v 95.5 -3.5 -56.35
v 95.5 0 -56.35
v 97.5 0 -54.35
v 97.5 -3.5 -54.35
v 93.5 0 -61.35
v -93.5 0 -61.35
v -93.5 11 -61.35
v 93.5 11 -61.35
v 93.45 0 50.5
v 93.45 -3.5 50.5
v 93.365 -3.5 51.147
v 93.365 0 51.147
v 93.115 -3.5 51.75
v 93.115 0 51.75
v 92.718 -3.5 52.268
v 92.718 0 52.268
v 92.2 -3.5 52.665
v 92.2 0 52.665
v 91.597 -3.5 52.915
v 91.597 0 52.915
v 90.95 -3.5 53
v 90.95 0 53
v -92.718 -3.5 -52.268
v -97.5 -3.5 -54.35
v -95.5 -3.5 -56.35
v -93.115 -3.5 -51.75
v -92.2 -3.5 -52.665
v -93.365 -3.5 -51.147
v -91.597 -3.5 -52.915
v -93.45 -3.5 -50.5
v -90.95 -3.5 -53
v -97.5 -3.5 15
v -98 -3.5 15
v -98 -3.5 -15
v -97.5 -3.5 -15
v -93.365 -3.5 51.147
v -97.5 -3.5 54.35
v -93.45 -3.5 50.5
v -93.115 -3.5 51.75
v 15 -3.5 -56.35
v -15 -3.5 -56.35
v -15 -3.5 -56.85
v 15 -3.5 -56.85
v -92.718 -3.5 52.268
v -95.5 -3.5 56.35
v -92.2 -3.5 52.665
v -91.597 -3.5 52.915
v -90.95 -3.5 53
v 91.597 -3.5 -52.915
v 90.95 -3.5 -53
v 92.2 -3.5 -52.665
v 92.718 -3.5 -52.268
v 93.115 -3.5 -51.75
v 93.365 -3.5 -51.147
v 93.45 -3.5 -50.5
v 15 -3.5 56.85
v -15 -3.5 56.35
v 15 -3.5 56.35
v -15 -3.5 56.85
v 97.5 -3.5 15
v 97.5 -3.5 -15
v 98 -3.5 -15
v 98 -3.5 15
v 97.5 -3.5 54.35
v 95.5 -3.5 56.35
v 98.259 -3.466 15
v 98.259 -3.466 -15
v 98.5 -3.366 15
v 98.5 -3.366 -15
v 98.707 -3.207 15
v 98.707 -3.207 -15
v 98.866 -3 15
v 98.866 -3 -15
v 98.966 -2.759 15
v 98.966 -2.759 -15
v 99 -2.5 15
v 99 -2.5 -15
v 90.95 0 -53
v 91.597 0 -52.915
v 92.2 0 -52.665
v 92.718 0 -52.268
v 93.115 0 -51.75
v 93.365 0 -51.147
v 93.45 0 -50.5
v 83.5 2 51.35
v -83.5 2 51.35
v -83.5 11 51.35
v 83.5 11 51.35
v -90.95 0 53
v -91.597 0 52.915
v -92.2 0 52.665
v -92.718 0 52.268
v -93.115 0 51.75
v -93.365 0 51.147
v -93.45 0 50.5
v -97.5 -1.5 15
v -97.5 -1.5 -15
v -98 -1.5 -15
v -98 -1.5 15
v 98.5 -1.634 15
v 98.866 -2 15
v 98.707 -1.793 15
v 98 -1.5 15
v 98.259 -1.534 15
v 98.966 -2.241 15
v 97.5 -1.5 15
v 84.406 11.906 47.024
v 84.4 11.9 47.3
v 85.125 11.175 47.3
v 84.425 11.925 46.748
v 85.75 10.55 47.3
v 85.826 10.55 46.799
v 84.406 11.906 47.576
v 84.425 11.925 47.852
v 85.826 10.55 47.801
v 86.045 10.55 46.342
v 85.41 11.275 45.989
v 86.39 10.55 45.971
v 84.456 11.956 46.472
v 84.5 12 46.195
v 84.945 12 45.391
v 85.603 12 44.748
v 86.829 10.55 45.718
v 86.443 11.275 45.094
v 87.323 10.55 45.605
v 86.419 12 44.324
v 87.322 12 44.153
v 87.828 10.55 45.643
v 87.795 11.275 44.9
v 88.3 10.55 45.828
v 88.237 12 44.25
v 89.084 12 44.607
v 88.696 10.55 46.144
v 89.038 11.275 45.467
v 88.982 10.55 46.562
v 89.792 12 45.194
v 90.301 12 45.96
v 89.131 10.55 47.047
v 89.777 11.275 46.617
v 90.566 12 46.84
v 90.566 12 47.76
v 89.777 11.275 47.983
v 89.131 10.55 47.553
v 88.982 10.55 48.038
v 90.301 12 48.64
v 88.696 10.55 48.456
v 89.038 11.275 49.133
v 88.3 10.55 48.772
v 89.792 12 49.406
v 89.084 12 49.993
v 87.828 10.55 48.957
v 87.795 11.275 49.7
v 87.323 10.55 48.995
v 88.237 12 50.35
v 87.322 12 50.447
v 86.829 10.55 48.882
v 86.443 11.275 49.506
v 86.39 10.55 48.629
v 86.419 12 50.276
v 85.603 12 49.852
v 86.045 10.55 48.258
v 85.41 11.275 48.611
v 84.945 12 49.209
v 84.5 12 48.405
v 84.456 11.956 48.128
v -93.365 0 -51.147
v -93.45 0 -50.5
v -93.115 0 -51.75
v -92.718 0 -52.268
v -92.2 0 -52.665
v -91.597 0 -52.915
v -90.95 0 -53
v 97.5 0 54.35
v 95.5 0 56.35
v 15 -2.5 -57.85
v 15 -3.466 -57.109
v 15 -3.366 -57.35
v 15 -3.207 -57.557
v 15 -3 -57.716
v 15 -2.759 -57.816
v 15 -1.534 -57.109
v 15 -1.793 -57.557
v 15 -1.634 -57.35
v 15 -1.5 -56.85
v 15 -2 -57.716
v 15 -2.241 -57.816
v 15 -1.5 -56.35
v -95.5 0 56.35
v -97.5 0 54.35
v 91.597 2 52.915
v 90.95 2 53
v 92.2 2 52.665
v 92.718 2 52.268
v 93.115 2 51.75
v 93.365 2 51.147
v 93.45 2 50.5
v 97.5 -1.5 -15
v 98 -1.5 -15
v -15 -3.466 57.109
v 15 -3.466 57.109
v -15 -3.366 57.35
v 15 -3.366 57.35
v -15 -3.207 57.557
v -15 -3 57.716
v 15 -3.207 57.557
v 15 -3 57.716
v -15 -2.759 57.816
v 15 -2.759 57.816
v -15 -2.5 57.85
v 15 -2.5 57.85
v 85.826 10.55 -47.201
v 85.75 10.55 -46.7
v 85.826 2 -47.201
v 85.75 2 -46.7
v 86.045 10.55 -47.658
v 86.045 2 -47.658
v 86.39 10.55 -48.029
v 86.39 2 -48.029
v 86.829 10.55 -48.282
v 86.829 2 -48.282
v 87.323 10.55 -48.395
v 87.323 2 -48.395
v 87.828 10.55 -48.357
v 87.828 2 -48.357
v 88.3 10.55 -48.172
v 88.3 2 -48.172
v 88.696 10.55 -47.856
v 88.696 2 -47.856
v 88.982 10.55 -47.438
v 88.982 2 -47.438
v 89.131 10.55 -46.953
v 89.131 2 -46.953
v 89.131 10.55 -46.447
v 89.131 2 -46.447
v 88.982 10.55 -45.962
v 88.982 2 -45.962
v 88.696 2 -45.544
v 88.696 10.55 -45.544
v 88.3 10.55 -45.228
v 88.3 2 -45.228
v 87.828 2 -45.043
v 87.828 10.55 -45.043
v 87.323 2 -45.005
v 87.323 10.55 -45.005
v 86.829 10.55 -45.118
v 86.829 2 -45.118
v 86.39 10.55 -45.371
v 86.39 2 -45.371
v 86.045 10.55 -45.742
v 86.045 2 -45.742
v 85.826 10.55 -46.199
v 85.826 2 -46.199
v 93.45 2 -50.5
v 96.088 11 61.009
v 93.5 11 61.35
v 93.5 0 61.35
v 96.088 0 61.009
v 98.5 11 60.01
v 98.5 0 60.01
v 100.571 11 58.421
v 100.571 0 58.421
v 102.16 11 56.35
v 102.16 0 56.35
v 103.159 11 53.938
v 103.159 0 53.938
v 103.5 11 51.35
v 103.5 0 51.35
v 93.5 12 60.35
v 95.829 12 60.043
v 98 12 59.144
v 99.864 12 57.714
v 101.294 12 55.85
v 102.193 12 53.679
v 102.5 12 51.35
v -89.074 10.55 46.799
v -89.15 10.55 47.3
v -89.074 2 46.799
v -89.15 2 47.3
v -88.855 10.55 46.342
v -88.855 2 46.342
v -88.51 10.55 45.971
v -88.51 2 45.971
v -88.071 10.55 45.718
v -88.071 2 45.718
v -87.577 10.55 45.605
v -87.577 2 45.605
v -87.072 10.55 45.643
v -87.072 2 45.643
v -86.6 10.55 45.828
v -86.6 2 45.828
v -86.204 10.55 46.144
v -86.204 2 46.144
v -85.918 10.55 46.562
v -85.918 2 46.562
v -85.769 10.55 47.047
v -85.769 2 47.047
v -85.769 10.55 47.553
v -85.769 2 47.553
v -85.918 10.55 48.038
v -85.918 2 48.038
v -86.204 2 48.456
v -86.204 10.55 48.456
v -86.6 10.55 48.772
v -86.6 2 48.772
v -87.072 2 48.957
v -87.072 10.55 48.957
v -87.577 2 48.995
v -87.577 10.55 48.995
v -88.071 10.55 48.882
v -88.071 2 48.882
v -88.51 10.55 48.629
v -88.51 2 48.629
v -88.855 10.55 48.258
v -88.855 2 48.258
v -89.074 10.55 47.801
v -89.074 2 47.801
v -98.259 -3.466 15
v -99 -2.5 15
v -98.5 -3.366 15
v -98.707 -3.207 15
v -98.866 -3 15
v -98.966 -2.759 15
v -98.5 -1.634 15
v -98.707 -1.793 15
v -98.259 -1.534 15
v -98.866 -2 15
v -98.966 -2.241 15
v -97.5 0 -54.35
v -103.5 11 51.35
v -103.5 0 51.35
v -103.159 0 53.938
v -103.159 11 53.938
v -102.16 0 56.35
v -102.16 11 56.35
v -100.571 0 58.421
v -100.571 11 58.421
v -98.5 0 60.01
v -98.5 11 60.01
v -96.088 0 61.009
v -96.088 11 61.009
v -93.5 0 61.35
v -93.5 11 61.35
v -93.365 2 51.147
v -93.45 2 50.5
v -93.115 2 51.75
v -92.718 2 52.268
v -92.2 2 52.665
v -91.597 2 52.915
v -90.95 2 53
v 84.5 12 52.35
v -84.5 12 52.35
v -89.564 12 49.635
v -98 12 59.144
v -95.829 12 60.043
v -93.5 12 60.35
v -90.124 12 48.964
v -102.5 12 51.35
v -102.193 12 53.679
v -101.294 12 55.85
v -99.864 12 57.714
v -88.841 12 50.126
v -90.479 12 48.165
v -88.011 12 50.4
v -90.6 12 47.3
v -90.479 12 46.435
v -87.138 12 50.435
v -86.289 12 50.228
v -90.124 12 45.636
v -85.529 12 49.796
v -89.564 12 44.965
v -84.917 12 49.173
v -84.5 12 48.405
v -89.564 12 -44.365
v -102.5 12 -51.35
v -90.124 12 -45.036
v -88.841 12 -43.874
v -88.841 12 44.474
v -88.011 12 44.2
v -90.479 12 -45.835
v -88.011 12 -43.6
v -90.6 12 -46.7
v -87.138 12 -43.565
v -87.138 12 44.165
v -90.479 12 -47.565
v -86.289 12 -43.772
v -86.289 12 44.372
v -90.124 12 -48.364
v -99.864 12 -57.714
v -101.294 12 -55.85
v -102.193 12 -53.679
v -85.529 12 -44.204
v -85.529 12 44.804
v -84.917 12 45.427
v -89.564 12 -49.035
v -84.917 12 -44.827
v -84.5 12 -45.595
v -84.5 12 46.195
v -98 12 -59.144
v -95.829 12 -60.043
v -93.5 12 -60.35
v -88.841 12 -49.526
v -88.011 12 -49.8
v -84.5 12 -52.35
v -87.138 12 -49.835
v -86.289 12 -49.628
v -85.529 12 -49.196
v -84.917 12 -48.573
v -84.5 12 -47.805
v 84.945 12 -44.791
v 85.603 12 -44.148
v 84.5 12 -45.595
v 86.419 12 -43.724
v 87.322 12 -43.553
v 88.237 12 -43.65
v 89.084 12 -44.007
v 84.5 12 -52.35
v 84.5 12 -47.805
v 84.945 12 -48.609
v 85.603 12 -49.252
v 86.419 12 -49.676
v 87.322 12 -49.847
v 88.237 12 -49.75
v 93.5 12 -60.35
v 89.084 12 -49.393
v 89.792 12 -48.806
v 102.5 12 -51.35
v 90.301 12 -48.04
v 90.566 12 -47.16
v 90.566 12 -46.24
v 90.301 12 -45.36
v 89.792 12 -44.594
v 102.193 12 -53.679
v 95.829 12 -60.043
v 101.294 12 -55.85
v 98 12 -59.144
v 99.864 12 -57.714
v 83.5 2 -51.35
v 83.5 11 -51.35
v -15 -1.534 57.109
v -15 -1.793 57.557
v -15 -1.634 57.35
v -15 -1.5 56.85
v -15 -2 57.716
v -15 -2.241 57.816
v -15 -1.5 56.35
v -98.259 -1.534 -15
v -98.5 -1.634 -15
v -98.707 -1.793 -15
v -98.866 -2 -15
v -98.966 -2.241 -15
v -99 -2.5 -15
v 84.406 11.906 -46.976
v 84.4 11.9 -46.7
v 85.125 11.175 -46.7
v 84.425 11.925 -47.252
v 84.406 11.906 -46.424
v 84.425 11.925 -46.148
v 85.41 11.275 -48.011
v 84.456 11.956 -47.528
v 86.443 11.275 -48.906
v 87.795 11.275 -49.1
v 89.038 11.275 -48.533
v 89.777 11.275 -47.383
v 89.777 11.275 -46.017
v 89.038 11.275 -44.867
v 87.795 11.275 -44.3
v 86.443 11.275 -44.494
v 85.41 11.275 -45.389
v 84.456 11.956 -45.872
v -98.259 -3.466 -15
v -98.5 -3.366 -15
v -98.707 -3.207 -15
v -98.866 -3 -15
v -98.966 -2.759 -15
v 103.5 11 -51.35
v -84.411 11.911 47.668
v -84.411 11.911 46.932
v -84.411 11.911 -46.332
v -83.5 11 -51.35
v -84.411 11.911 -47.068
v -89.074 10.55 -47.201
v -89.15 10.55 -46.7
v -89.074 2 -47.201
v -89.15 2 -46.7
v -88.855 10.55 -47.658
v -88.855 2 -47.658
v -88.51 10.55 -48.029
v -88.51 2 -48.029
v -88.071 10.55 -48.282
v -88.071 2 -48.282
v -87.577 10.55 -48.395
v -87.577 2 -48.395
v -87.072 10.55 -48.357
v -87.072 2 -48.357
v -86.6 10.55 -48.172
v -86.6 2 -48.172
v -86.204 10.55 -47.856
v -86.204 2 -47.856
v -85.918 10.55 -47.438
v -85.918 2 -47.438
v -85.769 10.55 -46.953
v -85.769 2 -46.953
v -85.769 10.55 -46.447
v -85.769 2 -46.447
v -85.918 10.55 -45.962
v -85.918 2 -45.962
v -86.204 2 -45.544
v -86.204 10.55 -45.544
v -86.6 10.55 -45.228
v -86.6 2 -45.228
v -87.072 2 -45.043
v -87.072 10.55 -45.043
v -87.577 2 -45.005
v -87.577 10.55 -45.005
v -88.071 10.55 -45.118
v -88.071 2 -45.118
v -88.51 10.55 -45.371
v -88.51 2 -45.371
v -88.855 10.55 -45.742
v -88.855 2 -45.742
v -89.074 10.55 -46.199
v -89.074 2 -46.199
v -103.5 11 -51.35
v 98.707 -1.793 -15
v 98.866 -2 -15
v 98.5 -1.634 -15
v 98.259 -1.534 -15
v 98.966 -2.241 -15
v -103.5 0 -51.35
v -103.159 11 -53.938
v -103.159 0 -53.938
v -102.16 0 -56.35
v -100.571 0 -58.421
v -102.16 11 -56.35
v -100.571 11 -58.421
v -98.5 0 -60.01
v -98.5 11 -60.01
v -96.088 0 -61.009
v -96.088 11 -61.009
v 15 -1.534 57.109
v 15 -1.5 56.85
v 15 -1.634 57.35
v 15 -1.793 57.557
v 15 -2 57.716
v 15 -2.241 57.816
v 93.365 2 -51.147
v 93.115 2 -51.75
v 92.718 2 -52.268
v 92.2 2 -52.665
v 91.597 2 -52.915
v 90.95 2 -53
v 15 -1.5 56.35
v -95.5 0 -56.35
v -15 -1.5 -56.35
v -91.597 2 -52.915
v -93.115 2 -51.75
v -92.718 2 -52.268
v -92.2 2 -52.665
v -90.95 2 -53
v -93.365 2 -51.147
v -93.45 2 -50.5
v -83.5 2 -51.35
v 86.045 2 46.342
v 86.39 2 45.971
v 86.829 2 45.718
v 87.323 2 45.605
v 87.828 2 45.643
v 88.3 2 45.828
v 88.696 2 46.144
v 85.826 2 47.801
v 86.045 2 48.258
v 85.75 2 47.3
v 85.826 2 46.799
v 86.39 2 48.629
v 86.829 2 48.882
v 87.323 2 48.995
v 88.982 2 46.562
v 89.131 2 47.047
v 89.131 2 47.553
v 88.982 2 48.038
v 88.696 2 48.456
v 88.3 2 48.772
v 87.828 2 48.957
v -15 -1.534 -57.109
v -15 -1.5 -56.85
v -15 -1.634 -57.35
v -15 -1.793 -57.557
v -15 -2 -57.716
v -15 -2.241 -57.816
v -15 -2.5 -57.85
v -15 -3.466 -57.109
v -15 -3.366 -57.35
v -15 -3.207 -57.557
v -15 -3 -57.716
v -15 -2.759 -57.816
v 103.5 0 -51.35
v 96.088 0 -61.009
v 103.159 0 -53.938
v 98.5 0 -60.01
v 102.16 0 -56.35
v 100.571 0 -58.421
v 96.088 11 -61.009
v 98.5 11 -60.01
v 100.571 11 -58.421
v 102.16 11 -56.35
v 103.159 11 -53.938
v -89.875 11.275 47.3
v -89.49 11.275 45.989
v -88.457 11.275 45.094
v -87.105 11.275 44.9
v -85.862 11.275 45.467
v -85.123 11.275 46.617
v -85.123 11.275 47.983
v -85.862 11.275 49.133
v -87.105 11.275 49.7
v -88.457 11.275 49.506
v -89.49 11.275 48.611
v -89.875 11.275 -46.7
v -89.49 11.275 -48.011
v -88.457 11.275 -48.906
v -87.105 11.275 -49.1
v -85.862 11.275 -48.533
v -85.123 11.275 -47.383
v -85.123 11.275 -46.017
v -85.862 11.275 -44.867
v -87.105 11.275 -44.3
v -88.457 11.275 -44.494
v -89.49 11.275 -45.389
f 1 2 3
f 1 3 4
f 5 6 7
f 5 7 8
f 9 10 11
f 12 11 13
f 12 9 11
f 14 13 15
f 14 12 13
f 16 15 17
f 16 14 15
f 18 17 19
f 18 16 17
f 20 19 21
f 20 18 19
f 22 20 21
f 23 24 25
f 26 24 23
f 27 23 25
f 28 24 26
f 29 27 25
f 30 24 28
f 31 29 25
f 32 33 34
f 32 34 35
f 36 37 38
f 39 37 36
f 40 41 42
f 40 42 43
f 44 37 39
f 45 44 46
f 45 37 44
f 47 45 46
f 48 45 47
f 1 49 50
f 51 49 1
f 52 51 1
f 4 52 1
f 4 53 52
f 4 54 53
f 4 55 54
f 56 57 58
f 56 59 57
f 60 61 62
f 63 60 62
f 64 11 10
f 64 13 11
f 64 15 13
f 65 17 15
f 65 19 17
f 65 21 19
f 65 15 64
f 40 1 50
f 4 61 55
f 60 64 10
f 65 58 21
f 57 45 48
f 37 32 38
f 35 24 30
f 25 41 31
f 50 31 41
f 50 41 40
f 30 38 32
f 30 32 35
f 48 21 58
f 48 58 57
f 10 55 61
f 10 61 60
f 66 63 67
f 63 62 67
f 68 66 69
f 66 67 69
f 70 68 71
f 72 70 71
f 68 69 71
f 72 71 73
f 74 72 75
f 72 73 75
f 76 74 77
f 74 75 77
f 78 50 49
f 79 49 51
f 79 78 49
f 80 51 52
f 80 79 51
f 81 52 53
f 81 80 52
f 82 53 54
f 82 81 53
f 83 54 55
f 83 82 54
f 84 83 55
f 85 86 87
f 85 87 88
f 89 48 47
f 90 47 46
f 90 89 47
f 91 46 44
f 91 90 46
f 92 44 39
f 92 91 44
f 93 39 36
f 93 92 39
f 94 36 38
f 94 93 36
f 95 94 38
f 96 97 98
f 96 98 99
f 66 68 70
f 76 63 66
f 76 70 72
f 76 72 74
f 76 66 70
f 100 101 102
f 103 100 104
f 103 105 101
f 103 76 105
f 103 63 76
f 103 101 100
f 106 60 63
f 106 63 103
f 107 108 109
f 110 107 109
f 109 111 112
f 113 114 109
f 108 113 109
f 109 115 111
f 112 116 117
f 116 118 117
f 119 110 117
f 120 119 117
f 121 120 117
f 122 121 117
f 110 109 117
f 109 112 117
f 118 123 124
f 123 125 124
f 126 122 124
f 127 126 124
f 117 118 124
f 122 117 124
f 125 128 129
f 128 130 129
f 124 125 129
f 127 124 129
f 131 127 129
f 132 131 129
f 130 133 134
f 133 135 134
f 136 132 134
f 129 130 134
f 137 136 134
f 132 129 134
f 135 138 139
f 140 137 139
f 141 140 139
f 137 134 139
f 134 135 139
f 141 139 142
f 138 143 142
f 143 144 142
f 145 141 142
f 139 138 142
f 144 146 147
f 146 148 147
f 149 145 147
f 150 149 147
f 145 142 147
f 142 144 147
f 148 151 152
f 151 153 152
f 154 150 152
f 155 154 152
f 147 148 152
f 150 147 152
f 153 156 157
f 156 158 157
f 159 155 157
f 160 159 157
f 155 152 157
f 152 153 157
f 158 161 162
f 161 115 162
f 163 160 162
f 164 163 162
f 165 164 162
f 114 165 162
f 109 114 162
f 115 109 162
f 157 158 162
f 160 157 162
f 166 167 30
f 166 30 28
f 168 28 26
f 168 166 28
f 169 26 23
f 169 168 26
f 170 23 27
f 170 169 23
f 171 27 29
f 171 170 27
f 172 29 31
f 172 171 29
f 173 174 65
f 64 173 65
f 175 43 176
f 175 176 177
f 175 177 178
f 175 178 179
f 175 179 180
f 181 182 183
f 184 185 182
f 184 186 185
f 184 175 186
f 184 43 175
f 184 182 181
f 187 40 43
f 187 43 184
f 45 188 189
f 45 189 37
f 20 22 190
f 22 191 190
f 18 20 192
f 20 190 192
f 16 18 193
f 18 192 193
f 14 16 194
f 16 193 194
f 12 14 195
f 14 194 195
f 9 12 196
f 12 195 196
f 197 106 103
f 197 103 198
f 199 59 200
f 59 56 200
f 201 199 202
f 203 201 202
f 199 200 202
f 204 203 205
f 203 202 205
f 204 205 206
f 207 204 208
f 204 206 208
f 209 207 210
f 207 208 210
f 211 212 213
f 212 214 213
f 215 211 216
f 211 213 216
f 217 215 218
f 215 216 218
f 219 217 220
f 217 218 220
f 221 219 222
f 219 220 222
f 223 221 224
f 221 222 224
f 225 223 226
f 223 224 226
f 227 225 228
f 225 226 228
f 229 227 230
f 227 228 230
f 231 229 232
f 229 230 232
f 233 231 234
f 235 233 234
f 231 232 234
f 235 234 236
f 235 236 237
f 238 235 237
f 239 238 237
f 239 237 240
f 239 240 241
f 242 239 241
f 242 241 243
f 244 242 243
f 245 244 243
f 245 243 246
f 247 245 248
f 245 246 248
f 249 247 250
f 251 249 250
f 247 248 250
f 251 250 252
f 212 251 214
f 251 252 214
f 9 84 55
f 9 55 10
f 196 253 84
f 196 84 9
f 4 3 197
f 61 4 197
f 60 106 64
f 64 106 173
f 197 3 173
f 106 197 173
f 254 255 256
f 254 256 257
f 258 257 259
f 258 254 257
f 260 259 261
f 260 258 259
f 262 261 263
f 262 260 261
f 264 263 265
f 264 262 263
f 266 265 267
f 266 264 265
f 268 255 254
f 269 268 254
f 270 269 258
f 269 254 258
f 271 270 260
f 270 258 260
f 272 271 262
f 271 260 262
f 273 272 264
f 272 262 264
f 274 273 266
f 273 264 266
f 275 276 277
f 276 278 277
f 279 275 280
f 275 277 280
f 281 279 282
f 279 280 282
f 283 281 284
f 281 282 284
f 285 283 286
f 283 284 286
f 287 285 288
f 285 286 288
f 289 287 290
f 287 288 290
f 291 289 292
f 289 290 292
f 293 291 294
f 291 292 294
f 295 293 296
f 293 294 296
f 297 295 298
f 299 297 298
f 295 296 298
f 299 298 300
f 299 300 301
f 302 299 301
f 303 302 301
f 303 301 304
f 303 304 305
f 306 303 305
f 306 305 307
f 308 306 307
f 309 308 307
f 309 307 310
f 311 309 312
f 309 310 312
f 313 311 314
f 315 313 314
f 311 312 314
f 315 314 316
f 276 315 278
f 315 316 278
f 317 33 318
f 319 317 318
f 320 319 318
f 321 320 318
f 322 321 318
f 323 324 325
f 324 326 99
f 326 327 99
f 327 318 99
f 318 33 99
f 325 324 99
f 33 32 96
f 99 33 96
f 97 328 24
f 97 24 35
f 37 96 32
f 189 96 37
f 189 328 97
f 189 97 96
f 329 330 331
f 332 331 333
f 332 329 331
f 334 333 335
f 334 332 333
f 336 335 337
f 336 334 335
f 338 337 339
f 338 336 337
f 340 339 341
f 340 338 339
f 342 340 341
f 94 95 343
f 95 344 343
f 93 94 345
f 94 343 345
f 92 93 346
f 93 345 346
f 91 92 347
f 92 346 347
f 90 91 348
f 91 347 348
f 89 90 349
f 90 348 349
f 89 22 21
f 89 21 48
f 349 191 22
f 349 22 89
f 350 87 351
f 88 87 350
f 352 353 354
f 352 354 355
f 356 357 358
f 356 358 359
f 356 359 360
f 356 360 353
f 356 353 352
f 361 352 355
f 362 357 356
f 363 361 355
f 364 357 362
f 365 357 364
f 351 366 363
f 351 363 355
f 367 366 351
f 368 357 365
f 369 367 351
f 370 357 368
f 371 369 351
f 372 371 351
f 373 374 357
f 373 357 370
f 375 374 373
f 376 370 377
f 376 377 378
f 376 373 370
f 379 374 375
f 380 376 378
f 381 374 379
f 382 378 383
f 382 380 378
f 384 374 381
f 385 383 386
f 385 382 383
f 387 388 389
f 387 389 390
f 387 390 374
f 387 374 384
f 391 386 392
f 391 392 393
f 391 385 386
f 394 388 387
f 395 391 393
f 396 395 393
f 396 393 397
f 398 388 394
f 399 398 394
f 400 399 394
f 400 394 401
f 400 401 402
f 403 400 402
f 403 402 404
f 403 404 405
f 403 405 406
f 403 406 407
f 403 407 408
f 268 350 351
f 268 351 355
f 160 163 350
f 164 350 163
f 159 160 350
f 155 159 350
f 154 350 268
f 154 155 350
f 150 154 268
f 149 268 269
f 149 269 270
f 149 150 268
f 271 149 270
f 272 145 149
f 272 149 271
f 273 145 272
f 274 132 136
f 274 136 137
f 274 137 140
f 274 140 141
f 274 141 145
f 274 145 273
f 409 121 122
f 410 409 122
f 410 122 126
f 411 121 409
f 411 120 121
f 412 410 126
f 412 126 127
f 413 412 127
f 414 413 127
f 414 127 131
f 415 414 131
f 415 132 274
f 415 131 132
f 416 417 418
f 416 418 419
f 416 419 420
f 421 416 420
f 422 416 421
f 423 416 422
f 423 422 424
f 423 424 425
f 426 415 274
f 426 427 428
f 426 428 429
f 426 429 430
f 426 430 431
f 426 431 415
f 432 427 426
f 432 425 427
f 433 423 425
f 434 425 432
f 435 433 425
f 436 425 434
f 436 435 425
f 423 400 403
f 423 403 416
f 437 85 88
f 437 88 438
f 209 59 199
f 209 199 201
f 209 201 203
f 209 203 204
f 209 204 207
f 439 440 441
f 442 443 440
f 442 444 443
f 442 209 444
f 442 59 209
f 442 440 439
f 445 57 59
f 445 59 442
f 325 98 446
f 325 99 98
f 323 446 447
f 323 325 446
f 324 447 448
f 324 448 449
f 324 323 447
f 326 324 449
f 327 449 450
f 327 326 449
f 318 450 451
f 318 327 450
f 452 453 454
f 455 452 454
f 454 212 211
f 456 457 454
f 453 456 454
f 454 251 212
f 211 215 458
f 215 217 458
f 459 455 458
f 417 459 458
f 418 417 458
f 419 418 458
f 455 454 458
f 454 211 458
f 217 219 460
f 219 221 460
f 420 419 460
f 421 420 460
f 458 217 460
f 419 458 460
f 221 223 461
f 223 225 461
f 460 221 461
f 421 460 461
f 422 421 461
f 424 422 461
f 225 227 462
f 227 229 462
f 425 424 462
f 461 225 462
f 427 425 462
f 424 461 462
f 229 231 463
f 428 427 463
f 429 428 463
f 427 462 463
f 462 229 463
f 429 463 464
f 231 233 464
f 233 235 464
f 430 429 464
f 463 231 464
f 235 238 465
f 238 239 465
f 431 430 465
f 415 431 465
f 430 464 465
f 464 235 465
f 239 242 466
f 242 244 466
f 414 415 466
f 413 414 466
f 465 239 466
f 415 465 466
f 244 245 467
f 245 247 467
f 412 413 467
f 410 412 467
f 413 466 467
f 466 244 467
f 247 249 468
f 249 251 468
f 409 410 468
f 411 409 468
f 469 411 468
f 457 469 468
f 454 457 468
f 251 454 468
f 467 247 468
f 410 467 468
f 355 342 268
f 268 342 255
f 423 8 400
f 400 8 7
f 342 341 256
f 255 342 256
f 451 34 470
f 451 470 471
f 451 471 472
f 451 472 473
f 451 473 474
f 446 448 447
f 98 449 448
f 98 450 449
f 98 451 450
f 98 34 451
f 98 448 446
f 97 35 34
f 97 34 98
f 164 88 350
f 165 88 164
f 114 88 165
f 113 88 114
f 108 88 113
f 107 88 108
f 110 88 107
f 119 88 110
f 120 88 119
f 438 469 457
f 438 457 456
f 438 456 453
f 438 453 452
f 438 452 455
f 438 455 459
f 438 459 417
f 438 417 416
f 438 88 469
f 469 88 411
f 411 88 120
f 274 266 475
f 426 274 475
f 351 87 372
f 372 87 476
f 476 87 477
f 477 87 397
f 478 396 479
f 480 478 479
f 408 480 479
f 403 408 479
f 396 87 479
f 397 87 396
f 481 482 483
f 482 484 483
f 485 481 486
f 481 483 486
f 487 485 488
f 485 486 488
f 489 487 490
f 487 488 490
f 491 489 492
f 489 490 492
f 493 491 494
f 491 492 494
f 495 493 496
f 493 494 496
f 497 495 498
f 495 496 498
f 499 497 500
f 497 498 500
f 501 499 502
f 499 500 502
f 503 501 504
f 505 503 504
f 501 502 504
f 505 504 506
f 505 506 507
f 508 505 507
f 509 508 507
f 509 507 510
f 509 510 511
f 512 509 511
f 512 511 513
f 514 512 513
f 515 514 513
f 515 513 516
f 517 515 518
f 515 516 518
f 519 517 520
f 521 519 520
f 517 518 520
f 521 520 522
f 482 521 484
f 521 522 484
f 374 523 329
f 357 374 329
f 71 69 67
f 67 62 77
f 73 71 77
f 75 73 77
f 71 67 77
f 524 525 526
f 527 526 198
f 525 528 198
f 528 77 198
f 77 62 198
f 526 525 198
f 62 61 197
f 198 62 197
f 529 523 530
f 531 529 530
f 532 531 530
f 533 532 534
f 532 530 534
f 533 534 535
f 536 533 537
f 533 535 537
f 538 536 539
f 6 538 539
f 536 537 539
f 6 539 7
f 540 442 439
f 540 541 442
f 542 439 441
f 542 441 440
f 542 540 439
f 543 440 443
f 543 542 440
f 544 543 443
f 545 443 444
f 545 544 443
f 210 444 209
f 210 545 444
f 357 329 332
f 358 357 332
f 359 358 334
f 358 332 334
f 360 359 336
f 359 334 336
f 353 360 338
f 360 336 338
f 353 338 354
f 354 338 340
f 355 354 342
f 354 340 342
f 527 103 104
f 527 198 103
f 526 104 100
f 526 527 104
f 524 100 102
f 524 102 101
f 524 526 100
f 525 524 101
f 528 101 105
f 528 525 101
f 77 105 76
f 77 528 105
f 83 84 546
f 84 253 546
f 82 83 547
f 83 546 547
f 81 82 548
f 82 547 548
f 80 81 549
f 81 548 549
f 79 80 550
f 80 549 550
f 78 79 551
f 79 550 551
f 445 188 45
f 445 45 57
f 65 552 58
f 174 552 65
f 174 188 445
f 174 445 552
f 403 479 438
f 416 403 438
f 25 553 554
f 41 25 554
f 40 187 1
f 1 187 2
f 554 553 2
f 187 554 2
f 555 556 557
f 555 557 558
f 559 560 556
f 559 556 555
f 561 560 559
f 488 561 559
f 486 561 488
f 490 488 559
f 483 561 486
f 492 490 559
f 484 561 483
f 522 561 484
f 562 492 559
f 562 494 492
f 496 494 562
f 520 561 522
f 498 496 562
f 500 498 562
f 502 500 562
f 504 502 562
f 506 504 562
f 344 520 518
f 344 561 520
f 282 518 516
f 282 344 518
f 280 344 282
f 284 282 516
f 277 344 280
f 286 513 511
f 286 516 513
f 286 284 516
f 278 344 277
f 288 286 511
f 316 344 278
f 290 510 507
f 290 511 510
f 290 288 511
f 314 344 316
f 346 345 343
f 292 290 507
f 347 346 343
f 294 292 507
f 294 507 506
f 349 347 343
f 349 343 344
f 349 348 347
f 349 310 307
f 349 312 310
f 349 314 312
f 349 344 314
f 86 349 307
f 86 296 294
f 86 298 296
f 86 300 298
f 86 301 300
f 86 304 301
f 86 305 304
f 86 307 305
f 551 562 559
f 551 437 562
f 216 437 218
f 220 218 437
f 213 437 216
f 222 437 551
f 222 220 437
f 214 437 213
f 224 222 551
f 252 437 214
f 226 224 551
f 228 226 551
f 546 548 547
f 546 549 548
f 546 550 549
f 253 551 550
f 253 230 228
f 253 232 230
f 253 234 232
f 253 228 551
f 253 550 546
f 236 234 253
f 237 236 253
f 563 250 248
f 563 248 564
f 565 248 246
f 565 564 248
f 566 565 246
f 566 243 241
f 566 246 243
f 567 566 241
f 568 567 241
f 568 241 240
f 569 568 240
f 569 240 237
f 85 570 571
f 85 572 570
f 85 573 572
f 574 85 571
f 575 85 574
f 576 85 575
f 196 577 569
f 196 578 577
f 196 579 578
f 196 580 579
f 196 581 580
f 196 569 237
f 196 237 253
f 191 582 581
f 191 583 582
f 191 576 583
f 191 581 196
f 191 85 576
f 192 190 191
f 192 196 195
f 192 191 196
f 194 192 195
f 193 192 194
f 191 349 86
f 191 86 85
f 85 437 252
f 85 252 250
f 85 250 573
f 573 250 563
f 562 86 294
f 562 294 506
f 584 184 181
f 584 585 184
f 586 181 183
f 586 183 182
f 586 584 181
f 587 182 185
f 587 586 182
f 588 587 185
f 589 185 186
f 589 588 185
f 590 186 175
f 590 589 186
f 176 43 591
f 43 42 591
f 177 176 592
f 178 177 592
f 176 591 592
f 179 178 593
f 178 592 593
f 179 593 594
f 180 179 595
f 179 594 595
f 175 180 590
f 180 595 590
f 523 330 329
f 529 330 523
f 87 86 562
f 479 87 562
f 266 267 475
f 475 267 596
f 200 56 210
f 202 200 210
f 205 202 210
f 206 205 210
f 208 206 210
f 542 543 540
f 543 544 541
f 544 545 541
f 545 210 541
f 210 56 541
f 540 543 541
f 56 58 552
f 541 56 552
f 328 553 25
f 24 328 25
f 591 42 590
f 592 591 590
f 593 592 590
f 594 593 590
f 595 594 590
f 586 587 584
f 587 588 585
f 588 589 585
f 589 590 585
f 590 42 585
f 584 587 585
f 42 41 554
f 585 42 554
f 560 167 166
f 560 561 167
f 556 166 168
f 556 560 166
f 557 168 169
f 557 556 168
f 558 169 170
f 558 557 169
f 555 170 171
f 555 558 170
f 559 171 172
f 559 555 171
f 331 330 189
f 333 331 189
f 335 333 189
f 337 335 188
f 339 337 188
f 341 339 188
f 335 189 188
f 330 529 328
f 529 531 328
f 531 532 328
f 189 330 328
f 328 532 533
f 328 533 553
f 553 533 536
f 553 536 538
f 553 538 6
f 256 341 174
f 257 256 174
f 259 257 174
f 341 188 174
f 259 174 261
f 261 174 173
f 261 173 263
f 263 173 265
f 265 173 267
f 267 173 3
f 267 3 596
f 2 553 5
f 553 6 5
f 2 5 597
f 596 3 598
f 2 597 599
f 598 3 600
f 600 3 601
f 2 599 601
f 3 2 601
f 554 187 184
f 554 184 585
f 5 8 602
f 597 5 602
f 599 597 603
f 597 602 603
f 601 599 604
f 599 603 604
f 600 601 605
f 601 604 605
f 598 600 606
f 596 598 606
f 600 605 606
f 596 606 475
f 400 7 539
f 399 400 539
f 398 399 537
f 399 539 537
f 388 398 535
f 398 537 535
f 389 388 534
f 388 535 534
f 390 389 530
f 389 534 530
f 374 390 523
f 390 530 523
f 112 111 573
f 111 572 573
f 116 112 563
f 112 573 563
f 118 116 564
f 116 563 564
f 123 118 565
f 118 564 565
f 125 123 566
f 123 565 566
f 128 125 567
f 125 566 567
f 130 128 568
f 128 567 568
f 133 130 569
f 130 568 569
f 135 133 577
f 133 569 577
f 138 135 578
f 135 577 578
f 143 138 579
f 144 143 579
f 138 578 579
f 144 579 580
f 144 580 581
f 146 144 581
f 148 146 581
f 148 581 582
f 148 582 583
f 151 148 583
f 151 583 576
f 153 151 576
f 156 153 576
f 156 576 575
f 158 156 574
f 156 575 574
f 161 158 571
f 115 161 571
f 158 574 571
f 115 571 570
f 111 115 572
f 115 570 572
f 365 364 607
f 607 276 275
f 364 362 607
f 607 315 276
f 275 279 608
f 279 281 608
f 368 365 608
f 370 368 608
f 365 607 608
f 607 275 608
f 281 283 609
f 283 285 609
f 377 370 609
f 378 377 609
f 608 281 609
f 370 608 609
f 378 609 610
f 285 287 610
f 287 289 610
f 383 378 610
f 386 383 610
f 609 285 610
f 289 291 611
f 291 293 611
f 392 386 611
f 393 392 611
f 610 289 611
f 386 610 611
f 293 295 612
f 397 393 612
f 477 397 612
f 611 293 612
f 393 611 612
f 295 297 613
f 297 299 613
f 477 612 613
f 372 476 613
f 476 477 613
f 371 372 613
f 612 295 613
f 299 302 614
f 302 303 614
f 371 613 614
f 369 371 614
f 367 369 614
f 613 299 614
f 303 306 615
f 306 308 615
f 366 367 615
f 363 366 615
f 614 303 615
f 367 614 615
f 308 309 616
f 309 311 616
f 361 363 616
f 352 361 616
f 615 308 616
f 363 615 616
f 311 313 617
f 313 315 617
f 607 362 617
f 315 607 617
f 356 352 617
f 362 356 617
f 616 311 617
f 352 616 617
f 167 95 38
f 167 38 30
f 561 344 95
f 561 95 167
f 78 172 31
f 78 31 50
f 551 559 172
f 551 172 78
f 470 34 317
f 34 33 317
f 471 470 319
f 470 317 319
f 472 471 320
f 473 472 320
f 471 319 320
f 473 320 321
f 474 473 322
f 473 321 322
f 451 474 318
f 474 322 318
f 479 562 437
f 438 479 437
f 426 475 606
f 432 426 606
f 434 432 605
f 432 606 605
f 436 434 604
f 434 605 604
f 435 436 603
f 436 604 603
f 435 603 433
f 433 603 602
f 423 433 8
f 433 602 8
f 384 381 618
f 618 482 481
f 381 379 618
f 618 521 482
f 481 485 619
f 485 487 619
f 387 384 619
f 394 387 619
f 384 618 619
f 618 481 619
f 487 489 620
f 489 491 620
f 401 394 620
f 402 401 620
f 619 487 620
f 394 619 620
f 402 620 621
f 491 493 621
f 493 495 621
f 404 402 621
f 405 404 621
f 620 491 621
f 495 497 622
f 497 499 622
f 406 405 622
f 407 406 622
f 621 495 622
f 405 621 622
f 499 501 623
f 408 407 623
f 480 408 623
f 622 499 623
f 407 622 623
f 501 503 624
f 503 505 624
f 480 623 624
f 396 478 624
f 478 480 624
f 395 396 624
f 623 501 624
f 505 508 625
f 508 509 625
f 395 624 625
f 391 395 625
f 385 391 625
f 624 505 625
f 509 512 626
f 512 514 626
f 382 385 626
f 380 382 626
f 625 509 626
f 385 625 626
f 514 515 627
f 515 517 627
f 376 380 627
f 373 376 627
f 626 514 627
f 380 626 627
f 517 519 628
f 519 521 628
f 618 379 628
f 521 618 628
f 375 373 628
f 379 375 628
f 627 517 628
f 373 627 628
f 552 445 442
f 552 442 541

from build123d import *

# Parameters (mm, degrees)
SKETCH1_W                                            = 207
SKETCH1_H                                            = 122.7
SKETCH1_W_2                                          = 167
SKETCH1_H_2                                          = 102.7
EXTRUDE1_DEPTH                                       = 12
FILLET1_R                                            = 10
CHAMFER1_SIZE                                        = 1
SKETCH2_W                                            = 186.9
SKETCH2_H                                            = 106
EXTRUDE2_DEPTH                                       = 2
FILLET2_R                                            = 2.5
SKETCH3_W                                            = 195
SKETCH3_H                                            = 112.7
EXTRUDE3_DEPTH                                       = 3.5
F_2_0_2_DIAMETER_HOLE1_D                             = 2
CSK_FOR_M3_COUNTERSUNK_RAISED_HEAD_SCREW_D           = 3.4
CSK_FOR_M3_COUNTERSUNK_RAISED_HEAD_SCREW_CSINK_D     = 6.3
CSK_FOR_M3_COUNTERSUNK_RAISED_HEAD_SCREW_CSINK_ANGLE = 90
CHAMFER2_SIZE                                        = 2
SKETCH12_W                                           = 30
SKETCH12_H                                           = 2
EXTRUDE4_DEPTH                                       = 1.5
FILLET3_R                                            = 1
SKETCH13_W                                           = 30
SKETCH13_H                                           = 2
EXTRUDE5_DEPTH                                       = 1.5
FILLET4_R                                            = 1
SKETCH14_W                                           = 30
SKETCH14_H                                           = 2
EXTRUDE6_DEPTH                                       = 1.5
FILLET5_R                                            = 1
SKETCH15_W                                           = 30
SKETCH15_H                                           = 2
EXTRUDE7_DEPTH                                       = 1.5
FILLET6_R                                            = 1


with BuildPart() as part:
    # Sketch1 → Extrude1 (new body)
    with BuildSketch(Plane(origin=(0, 0, 0), x_dir=(1, 0, 0), z_dir=(0, 1, 0))):
        Rectangle(SKETCH1_W, SKETCH1_H)
        Rectangle(SKETCH1_W_2, SKETCH1_H_2, mode=Mode.SUBTRACT)
    extrude(amount=EXTRUDE1_DEPTH)

    # Fillet1
    fillet1_edges = [part.edges().sort_by_distance(p)[0] for p in [
        (-103.5, 6, -61.35),
        (103.5, 6, -61.35),
        (103.5, 6, 61.35),
        (-103.5, 6, 61.35),
    ]]
    fillet(fillet1_edges, radius=FILLET1_R)

    # Chamfer1
    chamfer1_edges = [part.edges().sort_by_distance(p)[0] for p in [
        (-83.5, 12, 0),
        (0, 12, 51.35),
        (83.5, 12, 0),
        (0, 12, -51.35),
        (103.5, 12, 0),
        (0, 12, 61.35),
        (-103.5, 12, 0),
        (0, 12, -61.35),
        (-100.571067812, 12, 58.421067812),
        (-100.571067812, 12, -58.421067812),
        (100.571067812, 12, -58.421067812),
        (100.571067812, 12, 58.421067812),
    ]]
    chamfer(chamfer1_edges, length=CHAMFER1_SIZE)

    # Sketch2 → Extrude2 (cut)
    with BuildSketch(Plane.XZ):
        Rectangle(SKETCH2_W, SKETCH2_H)
    extrude(amount=-EXTRUDE2_DEPTH, mode=Mode.SUBTRACT)

    # Fillet2
    fillet2_edges = [part.edges().sort_by_distance(p)[0] for p in [
        (-93.45, 1, -53),
        (-93.45, 1, 53),
        (93.45, 1, 53),
        (93.45, 1, -53),
    ]]
    fillet(fillet2_edges, radius=FILLET2_R)

    # Sketch3 → Extrude3 (add)
    with BuildSketch(Plane.XZ):
        Rectangle(SKETCH3_W, SKETCH3_H)
        with BuildLine():
            Line((-90.95, -53), (90.95, -53))
            ThreePointArc((90.95, -53), (92.717766953, -52.267766953), (93.45, -50.5))
            Line((93.45, -50.5), (93.45, 50.5))
            ThreePointArc((93.45, 50.5), (92.717766953, 52.267766953), (90.95, 53))
            Line((90.95, 53), (-90.95, 53))
            ThreePointArc((-90.95, 53), (-92.717766953, 52.267766953), (-93.45, 50.5))
            Line((-93.45, 50.5), (-93.45, -50.5))
            ThreePointArc((-93.45, -50.5), (-92.717766953, -52.267766953), (-90.95, -53))
        make_face(mode=Mode.SUBTRACT)
    extrude(amount=EXTRUDE3_DEPTH)

    # Ø2.0 (2) Diameter Hole1 (through all)
    with Locations(Plane(origin=(-103.5, 2, 61.35), x_dir=(1, 0, 0), z_dir=(0, -1, 0))):
        with Locations((190.95, -14.05), (190.95, -108.05), (16.05, -108.05), (16.05, -14.05)):
            Hole(F_2_0_2_DIAMETER_HOLE1_D / 2)

    # CSK for M3 Countersunk Raised Head Screw2 (through all)
    with Locations(Plane(origin=(0, 12, 0), x_dir=(1, 0, 0), z_dir=(0, 1, 0))):
        with Locations((87.45, 46.7), (87.45, -47.3), (-87.45, -47.3), (-87.45, 46.7)):
            CounterSinkHole(CSK_FOR_M3_COUNTERSUNK_RAISED_HEAD_SCREW_D / 2, CSK_FOR_M3_COUNTERSUNK_RAISED_HEAD_SCREW_CSINK_D / 2, counter_sink_angle=CSK_FOR_M3_COUNTERSUNK_RAISED_HEAD_SCREW_CSINK_ANGLE)

    # Chamfer2
    chamfer2_edges = [part.edges().sort_by_distance(p)[0] for p in [
        (-97.5, -1.75, 56.35),
        (-97.5, -1.75, -56.35),
        (97.5, -1.75, -56.35),
        (97.5, -1.75, 56.35),
    ]]
    chamfer(chamfer2_edges, length=CHAMFER2_SIZE)

    # Sketch12 → Extrude4 (add)
    with BuildSketch(Plane.ZY.offset(97.5)):
        with Locations((0, -2.5)):
            Rectangle(SKETCH12_W, SKETCH12_H)
    extrude(amount=EXTRUDE4_DEPTH)

    # Fillet3
    fillet3_edges = [part.edges().sort_by_distance(p)[0] for p in [
        (-99, -3.5, 0),
        (-99, -1.5, 0),
    ]]
    fillet(fillet3_edges, radius=FILLET3_R - 0.0001)  # a hair under: the kernel refuses the full size

    # Sketch13 → Extrude5 (add)
    with BuildSketch(Plane(origin=(97.5, 0, 0), x_dir=(0, 0, -1), z_dir=(1, 0, 0))):
        with Locations((0, -2.5)):
            Rectangle(SKETCH13_W, SKETCH13_H)
    extrude(amount=EXTRUDE5_DEPTH)

    # Fillet4
    fillet4_edges = [part.edges().sort_by_distance(p)[0] for p in [
        (99, -1.5, 0),
        (99, -3.5, 0),
    ]]
    fillet(fillet4_edges, radius=FILLET4_R - 0.0001)  # a hair under: the kernel refuses the full size

    # Sketch14 → Extrude6 (add)
    with BuildSketch(Plane.XY.offset(56.35)):
        with Locations((0, -2.5)):
            Rectangle(SKETCH14_W, SKETCH14_H)
    extrude(amount=EXTRUDE6_DEPTH)

    # Fillet5
    fillet5_edges = [part.edges().sort_by_distance(p)[0] for p in [
        (0, -3.5, 57.85),
        (0, -1.5, 57.85),
    ]]
    fillet(fillet5_edges, radius=FILLET5_R - 0.0001)  # a hair under: the kernel refuses the full size

    # Sketch15 → Extrude7 (add)
    with BuildSketch(Plane(origin=(0, 0, -56.35), x_dir=(-1, 0, 0), z_dir=(0, 0, -1))):
        with Locations((0, -2.5)):
            Rectangle(SKETCH15_W, SKETCH15_H)
    extrude(amount=EXTRUDE7_DEPTH)

    # Fillet6
    fillet6_edges = [part.edges().sort_by_distance(p)[0] for p in [
        (0, -3.5, -57.85),
        (0, -1.5, -57.85),
    ]]
    fillet(fillet6_edges, radius=FILLET6_R - 0.0001)  # a hair under: the kernel refuses the full size


solid = part.part
